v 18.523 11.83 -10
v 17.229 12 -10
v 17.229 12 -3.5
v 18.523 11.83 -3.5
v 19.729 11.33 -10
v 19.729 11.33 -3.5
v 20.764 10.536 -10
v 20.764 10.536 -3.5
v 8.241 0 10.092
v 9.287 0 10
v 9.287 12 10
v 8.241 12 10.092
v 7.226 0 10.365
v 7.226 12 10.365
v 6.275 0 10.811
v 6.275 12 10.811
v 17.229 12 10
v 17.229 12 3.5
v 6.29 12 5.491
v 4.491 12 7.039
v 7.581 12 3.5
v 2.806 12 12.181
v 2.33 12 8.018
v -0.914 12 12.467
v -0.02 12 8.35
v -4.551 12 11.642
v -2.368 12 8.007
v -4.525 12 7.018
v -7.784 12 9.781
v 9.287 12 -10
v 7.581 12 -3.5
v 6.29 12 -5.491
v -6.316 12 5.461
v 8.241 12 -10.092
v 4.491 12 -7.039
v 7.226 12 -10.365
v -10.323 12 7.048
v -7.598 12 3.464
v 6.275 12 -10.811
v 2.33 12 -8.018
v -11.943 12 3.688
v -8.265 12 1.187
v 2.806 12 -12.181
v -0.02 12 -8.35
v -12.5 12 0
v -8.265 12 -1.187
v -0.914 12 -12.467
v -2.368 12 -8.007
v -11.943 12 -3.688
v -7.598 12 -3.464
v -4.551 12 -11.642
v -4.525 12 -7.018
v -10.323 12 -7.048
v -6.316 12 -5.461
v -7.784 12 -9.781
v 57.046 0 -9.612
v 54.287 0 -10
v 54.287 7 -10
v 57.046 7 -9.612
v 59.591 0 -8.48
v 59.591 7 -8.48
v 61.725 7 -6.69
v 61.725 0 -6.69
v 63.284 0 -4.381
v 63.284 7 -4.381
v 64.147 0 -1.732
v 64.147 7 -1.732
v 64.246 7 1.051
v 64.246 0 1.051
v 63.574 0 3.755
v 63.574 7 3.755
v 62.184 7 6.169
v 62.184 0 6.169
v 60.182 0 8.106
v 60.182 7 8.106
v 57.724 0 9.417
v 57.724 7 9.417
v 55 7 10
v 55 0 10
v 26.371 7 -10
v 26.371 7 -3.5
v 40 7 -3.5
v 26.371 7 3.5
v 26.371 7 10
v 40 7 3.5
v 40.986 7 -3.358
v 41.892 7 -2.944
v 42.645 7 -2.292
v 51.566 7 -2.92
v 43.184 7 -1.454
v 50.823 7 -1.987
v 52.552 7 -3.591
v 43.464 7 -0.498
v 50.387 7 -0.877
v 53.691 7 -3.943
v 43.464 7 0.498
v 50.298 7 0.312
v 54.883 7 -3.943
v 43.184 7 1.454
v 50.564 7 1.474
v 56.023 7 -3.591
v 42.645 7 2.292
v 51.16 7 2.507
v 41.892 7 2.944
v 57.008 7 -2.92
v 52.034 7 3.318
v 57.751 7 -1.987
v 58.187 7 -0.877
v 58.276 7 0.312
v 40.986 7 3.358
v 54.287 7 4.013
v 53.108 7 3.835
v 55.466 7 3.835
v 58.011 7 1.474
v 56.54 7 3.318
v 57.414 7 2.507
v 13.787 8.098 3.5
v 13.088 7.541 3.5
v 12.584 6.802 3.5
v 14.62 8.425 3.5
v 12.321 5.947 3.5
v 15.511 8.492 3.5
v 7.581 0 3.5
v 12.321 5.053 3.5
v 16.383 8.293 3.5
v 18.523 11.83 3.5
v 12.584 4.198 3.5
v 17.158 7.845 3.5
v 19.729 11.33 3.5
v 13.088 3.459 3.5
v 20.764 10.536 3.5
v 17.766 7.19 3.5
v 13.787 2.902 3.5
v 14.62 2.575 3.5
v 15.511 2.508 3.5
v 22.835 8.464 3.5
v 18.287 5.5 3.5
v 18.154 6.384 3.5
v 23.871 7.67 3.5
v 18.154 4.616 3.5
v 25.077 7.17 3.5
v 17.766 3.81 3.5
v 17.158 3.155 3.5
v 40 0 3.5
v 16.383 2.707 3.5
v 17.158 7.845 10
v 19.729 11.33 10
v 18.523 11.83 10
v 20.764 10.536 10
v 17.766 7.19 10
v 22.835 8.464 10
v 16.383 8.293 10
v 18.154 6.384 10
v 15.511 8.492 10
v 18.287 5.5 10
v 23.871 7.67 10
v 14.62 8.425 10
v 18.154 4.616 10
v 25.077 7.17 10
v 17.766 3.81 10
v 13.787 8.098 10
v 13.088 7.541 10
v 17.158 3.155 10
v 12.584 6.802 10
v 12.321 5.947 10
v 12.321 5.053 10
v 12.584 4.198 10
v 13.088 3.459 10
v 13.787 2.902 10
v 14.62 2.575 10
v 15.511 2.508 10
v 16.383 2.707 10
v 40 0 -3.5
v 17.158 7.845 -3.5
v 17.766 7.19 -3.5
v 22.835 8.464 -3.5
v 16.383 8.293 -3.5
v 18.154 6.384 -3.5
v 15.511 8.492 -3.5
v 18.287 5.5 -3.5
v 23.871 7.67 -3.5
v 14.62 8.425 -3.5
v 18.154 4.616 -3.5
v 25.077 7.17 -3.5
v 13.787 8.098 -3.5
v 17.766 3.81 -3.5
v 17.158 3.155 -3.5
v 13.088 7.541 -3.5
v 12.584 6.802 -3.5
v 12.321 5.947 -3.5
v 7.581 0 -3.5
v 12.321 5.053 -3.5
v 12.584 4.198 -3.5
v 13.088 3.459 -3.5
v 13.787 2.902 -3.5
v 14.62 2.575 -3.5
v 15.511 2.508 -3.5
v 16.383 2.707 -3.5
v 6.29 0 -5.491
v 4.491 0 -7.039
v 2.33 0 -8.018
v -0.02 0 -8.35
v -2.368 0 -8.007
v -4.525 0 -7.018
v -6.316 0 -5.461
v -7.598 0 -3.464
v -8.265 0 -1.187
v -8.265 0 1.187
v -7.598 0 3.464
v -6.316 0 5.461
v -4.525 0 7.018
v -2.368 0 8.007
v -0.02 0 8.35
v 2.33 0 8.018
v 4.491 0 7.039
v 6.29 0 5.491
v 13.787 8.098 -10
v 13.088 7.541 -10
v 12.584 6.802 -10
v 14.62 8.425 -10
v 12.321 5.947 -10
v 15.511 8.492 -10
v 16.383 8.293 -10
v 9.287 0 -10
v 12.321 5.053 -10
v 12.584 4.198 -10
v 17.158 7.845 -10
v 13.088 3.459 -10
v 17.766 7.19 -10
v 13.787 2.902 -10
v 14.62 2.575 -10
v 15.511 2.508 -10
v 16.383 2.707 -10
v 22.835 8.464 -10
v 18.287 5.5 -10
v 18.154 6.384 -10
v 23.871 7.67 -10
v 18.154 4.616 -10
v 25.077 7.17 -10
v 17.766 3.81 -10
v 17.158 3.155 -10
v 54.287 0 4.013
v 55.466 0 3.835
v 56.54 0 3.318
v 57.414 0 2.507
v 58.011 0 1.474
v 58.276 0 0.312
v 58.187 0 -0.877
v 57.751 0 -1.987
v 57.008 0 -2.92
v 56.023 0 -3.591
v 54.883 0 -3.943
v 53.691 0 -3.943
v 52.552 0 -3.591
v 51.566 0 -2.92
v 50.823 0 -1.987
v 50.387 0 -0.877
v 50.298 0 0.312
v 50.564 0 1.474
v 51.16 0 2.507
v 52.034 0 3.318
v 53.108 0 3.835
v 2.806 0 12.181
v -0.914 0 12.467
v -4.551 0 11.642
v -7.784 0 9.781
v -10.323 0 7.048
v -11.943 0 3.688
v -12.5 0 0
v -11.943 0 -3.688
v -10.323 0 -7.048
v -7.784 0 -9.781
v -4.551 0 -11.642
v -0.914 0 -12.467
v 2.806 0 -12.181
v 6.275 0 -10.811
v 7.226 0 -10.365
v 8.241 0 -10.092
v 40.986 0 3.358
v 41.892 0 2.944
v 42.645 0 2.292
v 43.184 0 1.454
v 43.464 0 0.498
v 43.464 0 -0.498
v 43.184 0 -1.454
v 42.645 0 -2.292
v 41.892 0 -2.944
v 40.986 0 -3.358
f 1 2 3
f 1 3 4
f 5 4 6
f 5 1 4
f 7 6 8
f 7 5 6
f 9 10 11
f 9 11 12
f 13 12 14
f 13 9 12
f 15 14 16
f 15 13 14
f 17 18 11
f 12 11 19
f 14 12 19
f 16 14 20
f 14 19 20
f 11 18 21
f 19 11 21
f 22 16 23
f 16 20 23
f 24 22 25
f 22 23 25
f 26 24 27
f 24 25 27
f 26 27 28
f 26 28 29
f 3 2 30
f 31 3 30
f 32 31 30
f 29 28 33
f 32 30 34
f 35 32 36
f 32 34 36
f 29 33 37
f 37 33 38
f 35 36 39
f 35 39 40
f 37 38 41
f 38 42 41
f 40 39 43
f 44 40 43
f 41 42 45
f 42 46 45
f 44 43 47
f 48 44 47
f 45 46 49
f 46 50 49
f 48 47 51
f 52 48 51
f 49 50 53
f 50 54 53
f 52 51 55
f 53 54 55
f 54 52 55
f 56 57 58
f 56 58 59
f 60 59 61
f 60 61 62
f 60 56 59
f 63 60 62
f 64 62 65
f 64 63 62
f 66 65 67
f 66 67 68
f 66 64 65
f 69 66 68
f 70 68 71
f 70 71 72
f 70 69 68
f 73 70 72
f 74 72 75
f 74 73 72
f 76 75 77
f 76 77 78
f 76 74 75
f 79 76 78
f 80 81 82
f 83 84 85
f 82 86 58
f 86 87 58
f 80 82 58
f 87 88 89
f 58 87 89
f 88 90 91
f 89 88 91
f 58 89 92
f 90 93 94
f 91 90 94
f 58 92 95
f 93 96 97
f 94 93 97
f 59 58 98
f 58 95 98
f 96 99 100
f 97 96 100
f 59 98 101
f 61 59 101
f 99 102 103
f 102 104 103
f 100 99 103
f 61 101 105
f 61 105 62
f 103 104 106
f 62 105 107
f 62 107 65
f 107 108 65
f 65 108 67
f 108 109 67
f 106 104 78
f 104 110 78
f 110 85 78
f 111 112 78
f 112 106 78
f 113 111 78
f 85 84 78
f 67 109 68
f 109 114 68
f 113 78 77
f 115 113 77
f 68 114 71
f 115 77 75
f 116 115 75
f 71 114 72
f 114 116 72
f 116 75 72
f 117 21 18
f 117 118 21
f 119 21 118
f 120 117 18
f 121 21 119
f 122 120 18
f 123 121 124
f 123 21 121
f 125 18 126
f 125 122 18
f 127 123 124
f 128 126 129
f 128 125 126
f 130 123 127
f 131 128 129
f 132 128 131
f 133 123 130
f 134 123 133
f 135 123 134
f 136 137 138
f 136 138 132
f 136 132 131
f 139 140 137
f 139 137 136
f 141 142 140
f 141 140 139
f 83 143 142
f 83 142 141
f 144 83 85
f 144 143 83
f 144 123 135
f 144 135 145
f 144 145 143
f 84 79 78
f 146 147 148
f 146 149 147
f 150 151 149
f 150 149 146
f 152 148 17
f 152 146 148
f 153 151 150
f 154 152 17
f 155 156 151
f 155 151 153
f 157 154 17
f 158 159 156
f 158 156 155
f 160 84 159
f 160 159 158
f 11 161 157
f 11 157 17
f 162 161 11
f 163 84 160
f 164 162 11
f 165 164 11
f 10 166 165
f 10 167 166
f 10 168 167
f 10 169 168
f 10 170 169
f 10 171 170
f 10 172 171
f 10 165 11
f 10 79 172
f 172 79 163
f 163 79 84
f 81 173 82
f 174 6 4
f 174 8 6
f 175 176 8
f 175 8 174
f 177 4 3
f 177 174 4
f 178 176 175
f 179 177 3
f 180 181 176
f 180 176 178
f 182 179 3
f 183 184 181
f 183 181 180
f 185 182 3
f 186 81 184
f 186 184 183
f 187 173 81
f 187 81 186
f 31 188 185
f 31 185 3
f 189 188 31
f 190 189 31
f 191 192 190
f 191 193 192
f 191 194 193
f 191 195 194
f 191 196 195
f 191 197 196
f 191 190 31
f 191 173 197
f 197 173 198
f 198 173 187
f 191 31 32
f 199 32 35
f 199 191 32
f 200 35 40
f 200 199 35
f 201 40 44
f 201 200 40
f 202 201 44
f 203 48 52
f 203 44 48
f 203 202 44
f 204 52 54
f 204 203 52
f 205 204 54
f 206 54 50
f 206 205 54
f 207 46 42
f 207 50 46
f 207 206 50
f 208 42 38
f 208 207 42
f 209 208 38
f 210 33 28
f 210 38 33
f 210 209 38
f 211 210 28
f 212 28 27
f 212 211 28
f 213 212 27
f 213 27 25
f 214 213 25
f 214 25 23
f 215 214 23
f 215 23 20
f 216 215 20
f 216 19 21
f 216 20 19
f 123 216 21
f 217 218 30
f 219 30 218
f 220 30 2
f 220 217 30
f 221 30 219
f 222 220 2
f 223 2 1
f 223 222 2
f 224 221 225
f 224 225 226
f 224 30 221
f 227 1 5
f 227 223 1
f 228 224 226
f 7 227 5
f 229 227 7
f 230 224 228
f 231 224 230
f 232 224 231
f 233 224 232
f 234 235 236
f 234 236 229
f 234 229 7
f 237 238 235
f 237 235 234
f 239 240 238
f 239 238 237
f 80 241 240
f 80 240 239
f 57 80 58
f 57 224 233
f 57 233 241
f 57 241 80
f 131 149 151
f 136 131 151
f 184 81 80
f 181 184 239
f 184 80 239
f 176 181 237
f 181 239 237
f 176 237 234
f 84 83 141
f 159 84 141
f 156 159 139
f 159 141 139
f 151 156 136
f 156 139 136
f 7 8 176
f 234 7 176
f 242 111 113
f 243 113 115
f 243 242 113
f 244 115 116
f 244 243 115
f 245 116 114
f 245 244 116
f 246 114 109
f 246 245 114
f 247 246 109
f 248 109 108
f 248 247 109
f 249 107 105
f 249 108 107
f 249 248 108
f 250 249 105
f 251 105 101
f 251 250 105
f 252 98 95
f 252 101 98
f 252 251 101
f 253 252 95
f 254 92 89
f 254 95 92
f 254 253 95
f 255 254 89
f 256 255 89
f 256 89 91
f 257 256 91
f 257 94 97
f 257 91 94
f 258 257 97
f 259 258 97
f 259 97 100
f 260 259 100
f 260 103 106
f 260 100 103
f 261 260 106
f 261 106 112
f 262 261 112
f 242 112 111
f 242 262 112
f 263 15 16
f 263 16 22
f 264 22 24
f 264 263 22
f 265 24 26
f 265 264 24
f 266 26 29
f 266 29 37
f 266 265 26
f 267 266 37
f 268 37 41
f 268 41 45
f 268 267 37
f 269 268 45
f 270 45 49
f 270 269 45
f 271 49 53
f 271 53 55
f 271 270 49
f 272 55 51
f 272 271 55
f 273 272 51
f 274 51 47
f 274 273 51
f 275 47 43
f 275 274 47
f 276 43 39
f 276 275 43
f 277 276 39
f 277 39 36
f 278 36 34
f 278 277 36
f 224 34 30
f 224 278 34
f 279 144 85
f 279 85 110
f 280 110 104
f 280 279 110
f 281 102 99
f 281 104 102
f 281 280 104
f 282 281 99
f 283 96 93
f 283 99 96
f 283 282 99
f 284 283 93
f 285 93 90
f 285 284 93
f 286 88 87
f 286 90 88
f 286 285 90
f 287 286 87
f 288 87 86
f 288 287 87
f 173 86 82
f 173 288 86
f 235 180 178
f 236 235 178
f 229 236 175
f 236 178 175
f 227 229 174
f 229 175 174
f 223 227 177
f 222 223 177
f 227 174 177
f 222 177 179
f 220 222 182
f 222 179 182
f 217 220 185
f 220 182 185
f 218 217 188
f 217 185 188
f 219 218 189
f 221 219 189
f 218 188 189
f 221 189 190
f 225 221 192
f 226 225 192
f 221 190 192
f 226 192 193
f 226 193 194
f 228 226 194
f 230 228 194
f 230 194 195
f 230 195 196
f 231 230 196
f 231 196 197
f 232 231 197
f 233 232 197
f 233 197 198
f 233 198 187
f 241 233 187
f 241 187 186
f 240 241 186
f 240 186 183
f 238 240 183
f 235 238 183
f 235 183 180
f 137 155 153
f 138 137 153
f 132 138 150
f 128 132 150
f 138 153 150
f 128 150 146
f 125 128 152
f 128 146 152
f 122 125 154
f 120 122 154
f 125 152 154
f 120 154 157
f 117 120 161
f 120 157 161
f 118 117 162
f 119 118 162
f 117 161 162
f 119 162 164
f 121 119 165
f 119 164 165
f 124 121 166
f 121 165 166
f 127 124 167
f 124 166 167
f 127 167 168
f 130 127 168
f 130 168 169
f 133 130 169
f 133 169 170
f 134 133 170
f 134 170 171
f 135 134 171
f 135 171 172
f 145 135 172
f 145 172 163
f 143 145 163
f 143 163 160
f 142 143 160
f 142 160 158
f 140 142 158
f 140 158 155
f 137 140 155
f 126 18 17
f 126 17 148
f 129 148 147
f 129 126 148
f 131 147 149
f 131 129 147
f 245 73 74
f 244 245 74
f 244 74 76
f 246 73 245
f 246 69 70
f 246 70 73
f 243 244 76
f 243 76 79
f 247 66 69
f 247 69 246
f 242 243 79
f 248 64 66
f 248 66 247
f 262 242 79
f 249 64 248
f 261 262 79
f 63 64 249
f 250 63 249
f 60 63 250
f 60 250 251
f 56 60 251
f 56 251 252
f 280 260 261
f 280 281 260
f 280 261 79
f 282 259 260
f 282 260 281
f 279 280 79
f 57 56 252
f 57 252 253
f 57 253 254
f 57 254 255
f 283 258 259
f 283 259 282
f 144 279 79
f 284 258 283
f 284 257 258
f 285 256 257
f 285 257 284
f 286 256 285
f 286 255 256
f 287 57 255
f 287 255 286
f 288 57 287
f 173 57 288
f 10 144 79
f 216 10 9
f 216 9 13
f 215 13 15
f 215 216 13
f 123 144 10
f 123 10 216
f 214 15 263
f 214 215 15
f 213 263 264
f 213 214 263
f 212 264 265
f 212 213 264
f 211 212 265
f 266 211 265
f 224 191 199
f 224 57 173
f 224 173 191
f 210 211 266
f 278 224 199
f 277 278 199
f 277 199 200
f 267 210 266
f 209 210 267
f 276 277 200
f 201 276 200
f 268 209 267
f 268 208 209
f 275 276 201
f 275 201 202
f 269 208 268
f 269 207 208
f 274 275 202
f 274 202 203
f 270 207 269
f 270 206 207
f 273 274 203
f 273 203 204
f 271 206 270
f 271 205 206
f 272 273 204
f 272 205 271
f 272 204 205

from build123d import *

# Parameters (mm, degrees)
SKETCH1_R               = 8.35
SKETCH1_R_2             = 4
BOSS_EXTRUDE1_DEPTH     = 12
CUT_EXTRUDE1_DEPTH      = 70.17162349
SKETCH4_R               = 3
CUT_EXTRUDE3_DEPTH      = 70.17162349
FILLET2_R               = 5
CUT_EXTRUDE4_DEPTH      = 67.593644564
CUT_EXTRUDE4_DEPTH_BACK = 67.593644564


with BuildPart() as part:
    # Sketch1 → Boss-Extrude1 (new body)
    with BuildSketch(Plane(origin=(0, 0, 0), x_dir=(1, 0, 0), z_dir=(0, 1, 0))):
        with BuildLine():
            Line((9.287087811, 10), (54.287087811, 10))
            ThreePointArc((54.287087811, 10), (64.293438841, 0.343976386), (55, -10))
            Line((55, -10), (9.287087811, -10))
            ThreePointArc((9.287087811, -10), (7.727462076, -10.20624754), (6.275059331, -10.810810811))
            ThreePointArc((6.275059331, -10.810810811), (-12.5, 0), (6.275059331, 10.810810811))
            ThreePointArc((6.275059331, 10.810810811), (7.727462076, 10.20624754), (9.287087811, 10))
        make_face()
        with Locations(Location((0, 0, 0), (0, 0, 270))):
            Circle(SKETCH1_R, mode=Mode.SUBTRACT)
        with Locations(Location((54.287087811, -0.012706095, 0), (0, 0, 270))):
            Circle(SKETCH1_R_2, mode=Mode.SUBTRACT)
    extrude(amount=BOSS_EXTRUDE1_DEPTH)

    # Sketch2 → Cut-Extrude1 (cut, through all)
    with BuildSketch(Plane.XY.offset(10)):
        Polygon((19.299793905, 12), (24.299793905, 7), (64.299793905, 7), (64.299793905, 12), align=None)
    extrude(amount=-CUT_EXTRUDE1_DEPTH, mode=Mode.SUBTRACT)

    # Sketch4 → Cut-Extrude3 (cut, through all)
    with BuildSketch(Plane.XY.offset(10)):
        with Locations((15.287087811, 5.5)):
            Circle(SKETCH4_R)
    extrude(amount=-CUT_EXTRUDE3_DEPTH, mode=Mode.SUBTRACT)

    # Fillet2
    fillet2_edges = [part.edges().sort_by_distance(p)[0] for p in [
        (24.299793905, 7, 0),
        (19.299793905, 12, 0),
    ]]
    fillet(fillet2_edges, radius=FILLET2_R)

    # Sketch5 → Cut-Extrude4 (cut, two sides: drawn at the far end of the back side and taken through both)
    with BuildSketch(Plane(origin=(0, 12, 0), x_dir=(1, 0, 0), z_dir=(0, 1, 0)).offset(-CUT_EXTRUDE4_DEPTH_BACK)):
        with BuildLine():
            Line((0, -3.5), (40, -3.5))
            ThreePointArc((40, -3.5), (43.5, 0), (40, 3.5))
            Line((40, 3.5), (0, 3.5))
            Line((0, 3.5), (0, -3.5))
        make_face()
    extrude(amount=CUT_EXTRUDE4_DEPTH + CUT_EXTRUDE4_DEPTH_BACK, mode=Mode.SUBTRACT)


solid = part.part
